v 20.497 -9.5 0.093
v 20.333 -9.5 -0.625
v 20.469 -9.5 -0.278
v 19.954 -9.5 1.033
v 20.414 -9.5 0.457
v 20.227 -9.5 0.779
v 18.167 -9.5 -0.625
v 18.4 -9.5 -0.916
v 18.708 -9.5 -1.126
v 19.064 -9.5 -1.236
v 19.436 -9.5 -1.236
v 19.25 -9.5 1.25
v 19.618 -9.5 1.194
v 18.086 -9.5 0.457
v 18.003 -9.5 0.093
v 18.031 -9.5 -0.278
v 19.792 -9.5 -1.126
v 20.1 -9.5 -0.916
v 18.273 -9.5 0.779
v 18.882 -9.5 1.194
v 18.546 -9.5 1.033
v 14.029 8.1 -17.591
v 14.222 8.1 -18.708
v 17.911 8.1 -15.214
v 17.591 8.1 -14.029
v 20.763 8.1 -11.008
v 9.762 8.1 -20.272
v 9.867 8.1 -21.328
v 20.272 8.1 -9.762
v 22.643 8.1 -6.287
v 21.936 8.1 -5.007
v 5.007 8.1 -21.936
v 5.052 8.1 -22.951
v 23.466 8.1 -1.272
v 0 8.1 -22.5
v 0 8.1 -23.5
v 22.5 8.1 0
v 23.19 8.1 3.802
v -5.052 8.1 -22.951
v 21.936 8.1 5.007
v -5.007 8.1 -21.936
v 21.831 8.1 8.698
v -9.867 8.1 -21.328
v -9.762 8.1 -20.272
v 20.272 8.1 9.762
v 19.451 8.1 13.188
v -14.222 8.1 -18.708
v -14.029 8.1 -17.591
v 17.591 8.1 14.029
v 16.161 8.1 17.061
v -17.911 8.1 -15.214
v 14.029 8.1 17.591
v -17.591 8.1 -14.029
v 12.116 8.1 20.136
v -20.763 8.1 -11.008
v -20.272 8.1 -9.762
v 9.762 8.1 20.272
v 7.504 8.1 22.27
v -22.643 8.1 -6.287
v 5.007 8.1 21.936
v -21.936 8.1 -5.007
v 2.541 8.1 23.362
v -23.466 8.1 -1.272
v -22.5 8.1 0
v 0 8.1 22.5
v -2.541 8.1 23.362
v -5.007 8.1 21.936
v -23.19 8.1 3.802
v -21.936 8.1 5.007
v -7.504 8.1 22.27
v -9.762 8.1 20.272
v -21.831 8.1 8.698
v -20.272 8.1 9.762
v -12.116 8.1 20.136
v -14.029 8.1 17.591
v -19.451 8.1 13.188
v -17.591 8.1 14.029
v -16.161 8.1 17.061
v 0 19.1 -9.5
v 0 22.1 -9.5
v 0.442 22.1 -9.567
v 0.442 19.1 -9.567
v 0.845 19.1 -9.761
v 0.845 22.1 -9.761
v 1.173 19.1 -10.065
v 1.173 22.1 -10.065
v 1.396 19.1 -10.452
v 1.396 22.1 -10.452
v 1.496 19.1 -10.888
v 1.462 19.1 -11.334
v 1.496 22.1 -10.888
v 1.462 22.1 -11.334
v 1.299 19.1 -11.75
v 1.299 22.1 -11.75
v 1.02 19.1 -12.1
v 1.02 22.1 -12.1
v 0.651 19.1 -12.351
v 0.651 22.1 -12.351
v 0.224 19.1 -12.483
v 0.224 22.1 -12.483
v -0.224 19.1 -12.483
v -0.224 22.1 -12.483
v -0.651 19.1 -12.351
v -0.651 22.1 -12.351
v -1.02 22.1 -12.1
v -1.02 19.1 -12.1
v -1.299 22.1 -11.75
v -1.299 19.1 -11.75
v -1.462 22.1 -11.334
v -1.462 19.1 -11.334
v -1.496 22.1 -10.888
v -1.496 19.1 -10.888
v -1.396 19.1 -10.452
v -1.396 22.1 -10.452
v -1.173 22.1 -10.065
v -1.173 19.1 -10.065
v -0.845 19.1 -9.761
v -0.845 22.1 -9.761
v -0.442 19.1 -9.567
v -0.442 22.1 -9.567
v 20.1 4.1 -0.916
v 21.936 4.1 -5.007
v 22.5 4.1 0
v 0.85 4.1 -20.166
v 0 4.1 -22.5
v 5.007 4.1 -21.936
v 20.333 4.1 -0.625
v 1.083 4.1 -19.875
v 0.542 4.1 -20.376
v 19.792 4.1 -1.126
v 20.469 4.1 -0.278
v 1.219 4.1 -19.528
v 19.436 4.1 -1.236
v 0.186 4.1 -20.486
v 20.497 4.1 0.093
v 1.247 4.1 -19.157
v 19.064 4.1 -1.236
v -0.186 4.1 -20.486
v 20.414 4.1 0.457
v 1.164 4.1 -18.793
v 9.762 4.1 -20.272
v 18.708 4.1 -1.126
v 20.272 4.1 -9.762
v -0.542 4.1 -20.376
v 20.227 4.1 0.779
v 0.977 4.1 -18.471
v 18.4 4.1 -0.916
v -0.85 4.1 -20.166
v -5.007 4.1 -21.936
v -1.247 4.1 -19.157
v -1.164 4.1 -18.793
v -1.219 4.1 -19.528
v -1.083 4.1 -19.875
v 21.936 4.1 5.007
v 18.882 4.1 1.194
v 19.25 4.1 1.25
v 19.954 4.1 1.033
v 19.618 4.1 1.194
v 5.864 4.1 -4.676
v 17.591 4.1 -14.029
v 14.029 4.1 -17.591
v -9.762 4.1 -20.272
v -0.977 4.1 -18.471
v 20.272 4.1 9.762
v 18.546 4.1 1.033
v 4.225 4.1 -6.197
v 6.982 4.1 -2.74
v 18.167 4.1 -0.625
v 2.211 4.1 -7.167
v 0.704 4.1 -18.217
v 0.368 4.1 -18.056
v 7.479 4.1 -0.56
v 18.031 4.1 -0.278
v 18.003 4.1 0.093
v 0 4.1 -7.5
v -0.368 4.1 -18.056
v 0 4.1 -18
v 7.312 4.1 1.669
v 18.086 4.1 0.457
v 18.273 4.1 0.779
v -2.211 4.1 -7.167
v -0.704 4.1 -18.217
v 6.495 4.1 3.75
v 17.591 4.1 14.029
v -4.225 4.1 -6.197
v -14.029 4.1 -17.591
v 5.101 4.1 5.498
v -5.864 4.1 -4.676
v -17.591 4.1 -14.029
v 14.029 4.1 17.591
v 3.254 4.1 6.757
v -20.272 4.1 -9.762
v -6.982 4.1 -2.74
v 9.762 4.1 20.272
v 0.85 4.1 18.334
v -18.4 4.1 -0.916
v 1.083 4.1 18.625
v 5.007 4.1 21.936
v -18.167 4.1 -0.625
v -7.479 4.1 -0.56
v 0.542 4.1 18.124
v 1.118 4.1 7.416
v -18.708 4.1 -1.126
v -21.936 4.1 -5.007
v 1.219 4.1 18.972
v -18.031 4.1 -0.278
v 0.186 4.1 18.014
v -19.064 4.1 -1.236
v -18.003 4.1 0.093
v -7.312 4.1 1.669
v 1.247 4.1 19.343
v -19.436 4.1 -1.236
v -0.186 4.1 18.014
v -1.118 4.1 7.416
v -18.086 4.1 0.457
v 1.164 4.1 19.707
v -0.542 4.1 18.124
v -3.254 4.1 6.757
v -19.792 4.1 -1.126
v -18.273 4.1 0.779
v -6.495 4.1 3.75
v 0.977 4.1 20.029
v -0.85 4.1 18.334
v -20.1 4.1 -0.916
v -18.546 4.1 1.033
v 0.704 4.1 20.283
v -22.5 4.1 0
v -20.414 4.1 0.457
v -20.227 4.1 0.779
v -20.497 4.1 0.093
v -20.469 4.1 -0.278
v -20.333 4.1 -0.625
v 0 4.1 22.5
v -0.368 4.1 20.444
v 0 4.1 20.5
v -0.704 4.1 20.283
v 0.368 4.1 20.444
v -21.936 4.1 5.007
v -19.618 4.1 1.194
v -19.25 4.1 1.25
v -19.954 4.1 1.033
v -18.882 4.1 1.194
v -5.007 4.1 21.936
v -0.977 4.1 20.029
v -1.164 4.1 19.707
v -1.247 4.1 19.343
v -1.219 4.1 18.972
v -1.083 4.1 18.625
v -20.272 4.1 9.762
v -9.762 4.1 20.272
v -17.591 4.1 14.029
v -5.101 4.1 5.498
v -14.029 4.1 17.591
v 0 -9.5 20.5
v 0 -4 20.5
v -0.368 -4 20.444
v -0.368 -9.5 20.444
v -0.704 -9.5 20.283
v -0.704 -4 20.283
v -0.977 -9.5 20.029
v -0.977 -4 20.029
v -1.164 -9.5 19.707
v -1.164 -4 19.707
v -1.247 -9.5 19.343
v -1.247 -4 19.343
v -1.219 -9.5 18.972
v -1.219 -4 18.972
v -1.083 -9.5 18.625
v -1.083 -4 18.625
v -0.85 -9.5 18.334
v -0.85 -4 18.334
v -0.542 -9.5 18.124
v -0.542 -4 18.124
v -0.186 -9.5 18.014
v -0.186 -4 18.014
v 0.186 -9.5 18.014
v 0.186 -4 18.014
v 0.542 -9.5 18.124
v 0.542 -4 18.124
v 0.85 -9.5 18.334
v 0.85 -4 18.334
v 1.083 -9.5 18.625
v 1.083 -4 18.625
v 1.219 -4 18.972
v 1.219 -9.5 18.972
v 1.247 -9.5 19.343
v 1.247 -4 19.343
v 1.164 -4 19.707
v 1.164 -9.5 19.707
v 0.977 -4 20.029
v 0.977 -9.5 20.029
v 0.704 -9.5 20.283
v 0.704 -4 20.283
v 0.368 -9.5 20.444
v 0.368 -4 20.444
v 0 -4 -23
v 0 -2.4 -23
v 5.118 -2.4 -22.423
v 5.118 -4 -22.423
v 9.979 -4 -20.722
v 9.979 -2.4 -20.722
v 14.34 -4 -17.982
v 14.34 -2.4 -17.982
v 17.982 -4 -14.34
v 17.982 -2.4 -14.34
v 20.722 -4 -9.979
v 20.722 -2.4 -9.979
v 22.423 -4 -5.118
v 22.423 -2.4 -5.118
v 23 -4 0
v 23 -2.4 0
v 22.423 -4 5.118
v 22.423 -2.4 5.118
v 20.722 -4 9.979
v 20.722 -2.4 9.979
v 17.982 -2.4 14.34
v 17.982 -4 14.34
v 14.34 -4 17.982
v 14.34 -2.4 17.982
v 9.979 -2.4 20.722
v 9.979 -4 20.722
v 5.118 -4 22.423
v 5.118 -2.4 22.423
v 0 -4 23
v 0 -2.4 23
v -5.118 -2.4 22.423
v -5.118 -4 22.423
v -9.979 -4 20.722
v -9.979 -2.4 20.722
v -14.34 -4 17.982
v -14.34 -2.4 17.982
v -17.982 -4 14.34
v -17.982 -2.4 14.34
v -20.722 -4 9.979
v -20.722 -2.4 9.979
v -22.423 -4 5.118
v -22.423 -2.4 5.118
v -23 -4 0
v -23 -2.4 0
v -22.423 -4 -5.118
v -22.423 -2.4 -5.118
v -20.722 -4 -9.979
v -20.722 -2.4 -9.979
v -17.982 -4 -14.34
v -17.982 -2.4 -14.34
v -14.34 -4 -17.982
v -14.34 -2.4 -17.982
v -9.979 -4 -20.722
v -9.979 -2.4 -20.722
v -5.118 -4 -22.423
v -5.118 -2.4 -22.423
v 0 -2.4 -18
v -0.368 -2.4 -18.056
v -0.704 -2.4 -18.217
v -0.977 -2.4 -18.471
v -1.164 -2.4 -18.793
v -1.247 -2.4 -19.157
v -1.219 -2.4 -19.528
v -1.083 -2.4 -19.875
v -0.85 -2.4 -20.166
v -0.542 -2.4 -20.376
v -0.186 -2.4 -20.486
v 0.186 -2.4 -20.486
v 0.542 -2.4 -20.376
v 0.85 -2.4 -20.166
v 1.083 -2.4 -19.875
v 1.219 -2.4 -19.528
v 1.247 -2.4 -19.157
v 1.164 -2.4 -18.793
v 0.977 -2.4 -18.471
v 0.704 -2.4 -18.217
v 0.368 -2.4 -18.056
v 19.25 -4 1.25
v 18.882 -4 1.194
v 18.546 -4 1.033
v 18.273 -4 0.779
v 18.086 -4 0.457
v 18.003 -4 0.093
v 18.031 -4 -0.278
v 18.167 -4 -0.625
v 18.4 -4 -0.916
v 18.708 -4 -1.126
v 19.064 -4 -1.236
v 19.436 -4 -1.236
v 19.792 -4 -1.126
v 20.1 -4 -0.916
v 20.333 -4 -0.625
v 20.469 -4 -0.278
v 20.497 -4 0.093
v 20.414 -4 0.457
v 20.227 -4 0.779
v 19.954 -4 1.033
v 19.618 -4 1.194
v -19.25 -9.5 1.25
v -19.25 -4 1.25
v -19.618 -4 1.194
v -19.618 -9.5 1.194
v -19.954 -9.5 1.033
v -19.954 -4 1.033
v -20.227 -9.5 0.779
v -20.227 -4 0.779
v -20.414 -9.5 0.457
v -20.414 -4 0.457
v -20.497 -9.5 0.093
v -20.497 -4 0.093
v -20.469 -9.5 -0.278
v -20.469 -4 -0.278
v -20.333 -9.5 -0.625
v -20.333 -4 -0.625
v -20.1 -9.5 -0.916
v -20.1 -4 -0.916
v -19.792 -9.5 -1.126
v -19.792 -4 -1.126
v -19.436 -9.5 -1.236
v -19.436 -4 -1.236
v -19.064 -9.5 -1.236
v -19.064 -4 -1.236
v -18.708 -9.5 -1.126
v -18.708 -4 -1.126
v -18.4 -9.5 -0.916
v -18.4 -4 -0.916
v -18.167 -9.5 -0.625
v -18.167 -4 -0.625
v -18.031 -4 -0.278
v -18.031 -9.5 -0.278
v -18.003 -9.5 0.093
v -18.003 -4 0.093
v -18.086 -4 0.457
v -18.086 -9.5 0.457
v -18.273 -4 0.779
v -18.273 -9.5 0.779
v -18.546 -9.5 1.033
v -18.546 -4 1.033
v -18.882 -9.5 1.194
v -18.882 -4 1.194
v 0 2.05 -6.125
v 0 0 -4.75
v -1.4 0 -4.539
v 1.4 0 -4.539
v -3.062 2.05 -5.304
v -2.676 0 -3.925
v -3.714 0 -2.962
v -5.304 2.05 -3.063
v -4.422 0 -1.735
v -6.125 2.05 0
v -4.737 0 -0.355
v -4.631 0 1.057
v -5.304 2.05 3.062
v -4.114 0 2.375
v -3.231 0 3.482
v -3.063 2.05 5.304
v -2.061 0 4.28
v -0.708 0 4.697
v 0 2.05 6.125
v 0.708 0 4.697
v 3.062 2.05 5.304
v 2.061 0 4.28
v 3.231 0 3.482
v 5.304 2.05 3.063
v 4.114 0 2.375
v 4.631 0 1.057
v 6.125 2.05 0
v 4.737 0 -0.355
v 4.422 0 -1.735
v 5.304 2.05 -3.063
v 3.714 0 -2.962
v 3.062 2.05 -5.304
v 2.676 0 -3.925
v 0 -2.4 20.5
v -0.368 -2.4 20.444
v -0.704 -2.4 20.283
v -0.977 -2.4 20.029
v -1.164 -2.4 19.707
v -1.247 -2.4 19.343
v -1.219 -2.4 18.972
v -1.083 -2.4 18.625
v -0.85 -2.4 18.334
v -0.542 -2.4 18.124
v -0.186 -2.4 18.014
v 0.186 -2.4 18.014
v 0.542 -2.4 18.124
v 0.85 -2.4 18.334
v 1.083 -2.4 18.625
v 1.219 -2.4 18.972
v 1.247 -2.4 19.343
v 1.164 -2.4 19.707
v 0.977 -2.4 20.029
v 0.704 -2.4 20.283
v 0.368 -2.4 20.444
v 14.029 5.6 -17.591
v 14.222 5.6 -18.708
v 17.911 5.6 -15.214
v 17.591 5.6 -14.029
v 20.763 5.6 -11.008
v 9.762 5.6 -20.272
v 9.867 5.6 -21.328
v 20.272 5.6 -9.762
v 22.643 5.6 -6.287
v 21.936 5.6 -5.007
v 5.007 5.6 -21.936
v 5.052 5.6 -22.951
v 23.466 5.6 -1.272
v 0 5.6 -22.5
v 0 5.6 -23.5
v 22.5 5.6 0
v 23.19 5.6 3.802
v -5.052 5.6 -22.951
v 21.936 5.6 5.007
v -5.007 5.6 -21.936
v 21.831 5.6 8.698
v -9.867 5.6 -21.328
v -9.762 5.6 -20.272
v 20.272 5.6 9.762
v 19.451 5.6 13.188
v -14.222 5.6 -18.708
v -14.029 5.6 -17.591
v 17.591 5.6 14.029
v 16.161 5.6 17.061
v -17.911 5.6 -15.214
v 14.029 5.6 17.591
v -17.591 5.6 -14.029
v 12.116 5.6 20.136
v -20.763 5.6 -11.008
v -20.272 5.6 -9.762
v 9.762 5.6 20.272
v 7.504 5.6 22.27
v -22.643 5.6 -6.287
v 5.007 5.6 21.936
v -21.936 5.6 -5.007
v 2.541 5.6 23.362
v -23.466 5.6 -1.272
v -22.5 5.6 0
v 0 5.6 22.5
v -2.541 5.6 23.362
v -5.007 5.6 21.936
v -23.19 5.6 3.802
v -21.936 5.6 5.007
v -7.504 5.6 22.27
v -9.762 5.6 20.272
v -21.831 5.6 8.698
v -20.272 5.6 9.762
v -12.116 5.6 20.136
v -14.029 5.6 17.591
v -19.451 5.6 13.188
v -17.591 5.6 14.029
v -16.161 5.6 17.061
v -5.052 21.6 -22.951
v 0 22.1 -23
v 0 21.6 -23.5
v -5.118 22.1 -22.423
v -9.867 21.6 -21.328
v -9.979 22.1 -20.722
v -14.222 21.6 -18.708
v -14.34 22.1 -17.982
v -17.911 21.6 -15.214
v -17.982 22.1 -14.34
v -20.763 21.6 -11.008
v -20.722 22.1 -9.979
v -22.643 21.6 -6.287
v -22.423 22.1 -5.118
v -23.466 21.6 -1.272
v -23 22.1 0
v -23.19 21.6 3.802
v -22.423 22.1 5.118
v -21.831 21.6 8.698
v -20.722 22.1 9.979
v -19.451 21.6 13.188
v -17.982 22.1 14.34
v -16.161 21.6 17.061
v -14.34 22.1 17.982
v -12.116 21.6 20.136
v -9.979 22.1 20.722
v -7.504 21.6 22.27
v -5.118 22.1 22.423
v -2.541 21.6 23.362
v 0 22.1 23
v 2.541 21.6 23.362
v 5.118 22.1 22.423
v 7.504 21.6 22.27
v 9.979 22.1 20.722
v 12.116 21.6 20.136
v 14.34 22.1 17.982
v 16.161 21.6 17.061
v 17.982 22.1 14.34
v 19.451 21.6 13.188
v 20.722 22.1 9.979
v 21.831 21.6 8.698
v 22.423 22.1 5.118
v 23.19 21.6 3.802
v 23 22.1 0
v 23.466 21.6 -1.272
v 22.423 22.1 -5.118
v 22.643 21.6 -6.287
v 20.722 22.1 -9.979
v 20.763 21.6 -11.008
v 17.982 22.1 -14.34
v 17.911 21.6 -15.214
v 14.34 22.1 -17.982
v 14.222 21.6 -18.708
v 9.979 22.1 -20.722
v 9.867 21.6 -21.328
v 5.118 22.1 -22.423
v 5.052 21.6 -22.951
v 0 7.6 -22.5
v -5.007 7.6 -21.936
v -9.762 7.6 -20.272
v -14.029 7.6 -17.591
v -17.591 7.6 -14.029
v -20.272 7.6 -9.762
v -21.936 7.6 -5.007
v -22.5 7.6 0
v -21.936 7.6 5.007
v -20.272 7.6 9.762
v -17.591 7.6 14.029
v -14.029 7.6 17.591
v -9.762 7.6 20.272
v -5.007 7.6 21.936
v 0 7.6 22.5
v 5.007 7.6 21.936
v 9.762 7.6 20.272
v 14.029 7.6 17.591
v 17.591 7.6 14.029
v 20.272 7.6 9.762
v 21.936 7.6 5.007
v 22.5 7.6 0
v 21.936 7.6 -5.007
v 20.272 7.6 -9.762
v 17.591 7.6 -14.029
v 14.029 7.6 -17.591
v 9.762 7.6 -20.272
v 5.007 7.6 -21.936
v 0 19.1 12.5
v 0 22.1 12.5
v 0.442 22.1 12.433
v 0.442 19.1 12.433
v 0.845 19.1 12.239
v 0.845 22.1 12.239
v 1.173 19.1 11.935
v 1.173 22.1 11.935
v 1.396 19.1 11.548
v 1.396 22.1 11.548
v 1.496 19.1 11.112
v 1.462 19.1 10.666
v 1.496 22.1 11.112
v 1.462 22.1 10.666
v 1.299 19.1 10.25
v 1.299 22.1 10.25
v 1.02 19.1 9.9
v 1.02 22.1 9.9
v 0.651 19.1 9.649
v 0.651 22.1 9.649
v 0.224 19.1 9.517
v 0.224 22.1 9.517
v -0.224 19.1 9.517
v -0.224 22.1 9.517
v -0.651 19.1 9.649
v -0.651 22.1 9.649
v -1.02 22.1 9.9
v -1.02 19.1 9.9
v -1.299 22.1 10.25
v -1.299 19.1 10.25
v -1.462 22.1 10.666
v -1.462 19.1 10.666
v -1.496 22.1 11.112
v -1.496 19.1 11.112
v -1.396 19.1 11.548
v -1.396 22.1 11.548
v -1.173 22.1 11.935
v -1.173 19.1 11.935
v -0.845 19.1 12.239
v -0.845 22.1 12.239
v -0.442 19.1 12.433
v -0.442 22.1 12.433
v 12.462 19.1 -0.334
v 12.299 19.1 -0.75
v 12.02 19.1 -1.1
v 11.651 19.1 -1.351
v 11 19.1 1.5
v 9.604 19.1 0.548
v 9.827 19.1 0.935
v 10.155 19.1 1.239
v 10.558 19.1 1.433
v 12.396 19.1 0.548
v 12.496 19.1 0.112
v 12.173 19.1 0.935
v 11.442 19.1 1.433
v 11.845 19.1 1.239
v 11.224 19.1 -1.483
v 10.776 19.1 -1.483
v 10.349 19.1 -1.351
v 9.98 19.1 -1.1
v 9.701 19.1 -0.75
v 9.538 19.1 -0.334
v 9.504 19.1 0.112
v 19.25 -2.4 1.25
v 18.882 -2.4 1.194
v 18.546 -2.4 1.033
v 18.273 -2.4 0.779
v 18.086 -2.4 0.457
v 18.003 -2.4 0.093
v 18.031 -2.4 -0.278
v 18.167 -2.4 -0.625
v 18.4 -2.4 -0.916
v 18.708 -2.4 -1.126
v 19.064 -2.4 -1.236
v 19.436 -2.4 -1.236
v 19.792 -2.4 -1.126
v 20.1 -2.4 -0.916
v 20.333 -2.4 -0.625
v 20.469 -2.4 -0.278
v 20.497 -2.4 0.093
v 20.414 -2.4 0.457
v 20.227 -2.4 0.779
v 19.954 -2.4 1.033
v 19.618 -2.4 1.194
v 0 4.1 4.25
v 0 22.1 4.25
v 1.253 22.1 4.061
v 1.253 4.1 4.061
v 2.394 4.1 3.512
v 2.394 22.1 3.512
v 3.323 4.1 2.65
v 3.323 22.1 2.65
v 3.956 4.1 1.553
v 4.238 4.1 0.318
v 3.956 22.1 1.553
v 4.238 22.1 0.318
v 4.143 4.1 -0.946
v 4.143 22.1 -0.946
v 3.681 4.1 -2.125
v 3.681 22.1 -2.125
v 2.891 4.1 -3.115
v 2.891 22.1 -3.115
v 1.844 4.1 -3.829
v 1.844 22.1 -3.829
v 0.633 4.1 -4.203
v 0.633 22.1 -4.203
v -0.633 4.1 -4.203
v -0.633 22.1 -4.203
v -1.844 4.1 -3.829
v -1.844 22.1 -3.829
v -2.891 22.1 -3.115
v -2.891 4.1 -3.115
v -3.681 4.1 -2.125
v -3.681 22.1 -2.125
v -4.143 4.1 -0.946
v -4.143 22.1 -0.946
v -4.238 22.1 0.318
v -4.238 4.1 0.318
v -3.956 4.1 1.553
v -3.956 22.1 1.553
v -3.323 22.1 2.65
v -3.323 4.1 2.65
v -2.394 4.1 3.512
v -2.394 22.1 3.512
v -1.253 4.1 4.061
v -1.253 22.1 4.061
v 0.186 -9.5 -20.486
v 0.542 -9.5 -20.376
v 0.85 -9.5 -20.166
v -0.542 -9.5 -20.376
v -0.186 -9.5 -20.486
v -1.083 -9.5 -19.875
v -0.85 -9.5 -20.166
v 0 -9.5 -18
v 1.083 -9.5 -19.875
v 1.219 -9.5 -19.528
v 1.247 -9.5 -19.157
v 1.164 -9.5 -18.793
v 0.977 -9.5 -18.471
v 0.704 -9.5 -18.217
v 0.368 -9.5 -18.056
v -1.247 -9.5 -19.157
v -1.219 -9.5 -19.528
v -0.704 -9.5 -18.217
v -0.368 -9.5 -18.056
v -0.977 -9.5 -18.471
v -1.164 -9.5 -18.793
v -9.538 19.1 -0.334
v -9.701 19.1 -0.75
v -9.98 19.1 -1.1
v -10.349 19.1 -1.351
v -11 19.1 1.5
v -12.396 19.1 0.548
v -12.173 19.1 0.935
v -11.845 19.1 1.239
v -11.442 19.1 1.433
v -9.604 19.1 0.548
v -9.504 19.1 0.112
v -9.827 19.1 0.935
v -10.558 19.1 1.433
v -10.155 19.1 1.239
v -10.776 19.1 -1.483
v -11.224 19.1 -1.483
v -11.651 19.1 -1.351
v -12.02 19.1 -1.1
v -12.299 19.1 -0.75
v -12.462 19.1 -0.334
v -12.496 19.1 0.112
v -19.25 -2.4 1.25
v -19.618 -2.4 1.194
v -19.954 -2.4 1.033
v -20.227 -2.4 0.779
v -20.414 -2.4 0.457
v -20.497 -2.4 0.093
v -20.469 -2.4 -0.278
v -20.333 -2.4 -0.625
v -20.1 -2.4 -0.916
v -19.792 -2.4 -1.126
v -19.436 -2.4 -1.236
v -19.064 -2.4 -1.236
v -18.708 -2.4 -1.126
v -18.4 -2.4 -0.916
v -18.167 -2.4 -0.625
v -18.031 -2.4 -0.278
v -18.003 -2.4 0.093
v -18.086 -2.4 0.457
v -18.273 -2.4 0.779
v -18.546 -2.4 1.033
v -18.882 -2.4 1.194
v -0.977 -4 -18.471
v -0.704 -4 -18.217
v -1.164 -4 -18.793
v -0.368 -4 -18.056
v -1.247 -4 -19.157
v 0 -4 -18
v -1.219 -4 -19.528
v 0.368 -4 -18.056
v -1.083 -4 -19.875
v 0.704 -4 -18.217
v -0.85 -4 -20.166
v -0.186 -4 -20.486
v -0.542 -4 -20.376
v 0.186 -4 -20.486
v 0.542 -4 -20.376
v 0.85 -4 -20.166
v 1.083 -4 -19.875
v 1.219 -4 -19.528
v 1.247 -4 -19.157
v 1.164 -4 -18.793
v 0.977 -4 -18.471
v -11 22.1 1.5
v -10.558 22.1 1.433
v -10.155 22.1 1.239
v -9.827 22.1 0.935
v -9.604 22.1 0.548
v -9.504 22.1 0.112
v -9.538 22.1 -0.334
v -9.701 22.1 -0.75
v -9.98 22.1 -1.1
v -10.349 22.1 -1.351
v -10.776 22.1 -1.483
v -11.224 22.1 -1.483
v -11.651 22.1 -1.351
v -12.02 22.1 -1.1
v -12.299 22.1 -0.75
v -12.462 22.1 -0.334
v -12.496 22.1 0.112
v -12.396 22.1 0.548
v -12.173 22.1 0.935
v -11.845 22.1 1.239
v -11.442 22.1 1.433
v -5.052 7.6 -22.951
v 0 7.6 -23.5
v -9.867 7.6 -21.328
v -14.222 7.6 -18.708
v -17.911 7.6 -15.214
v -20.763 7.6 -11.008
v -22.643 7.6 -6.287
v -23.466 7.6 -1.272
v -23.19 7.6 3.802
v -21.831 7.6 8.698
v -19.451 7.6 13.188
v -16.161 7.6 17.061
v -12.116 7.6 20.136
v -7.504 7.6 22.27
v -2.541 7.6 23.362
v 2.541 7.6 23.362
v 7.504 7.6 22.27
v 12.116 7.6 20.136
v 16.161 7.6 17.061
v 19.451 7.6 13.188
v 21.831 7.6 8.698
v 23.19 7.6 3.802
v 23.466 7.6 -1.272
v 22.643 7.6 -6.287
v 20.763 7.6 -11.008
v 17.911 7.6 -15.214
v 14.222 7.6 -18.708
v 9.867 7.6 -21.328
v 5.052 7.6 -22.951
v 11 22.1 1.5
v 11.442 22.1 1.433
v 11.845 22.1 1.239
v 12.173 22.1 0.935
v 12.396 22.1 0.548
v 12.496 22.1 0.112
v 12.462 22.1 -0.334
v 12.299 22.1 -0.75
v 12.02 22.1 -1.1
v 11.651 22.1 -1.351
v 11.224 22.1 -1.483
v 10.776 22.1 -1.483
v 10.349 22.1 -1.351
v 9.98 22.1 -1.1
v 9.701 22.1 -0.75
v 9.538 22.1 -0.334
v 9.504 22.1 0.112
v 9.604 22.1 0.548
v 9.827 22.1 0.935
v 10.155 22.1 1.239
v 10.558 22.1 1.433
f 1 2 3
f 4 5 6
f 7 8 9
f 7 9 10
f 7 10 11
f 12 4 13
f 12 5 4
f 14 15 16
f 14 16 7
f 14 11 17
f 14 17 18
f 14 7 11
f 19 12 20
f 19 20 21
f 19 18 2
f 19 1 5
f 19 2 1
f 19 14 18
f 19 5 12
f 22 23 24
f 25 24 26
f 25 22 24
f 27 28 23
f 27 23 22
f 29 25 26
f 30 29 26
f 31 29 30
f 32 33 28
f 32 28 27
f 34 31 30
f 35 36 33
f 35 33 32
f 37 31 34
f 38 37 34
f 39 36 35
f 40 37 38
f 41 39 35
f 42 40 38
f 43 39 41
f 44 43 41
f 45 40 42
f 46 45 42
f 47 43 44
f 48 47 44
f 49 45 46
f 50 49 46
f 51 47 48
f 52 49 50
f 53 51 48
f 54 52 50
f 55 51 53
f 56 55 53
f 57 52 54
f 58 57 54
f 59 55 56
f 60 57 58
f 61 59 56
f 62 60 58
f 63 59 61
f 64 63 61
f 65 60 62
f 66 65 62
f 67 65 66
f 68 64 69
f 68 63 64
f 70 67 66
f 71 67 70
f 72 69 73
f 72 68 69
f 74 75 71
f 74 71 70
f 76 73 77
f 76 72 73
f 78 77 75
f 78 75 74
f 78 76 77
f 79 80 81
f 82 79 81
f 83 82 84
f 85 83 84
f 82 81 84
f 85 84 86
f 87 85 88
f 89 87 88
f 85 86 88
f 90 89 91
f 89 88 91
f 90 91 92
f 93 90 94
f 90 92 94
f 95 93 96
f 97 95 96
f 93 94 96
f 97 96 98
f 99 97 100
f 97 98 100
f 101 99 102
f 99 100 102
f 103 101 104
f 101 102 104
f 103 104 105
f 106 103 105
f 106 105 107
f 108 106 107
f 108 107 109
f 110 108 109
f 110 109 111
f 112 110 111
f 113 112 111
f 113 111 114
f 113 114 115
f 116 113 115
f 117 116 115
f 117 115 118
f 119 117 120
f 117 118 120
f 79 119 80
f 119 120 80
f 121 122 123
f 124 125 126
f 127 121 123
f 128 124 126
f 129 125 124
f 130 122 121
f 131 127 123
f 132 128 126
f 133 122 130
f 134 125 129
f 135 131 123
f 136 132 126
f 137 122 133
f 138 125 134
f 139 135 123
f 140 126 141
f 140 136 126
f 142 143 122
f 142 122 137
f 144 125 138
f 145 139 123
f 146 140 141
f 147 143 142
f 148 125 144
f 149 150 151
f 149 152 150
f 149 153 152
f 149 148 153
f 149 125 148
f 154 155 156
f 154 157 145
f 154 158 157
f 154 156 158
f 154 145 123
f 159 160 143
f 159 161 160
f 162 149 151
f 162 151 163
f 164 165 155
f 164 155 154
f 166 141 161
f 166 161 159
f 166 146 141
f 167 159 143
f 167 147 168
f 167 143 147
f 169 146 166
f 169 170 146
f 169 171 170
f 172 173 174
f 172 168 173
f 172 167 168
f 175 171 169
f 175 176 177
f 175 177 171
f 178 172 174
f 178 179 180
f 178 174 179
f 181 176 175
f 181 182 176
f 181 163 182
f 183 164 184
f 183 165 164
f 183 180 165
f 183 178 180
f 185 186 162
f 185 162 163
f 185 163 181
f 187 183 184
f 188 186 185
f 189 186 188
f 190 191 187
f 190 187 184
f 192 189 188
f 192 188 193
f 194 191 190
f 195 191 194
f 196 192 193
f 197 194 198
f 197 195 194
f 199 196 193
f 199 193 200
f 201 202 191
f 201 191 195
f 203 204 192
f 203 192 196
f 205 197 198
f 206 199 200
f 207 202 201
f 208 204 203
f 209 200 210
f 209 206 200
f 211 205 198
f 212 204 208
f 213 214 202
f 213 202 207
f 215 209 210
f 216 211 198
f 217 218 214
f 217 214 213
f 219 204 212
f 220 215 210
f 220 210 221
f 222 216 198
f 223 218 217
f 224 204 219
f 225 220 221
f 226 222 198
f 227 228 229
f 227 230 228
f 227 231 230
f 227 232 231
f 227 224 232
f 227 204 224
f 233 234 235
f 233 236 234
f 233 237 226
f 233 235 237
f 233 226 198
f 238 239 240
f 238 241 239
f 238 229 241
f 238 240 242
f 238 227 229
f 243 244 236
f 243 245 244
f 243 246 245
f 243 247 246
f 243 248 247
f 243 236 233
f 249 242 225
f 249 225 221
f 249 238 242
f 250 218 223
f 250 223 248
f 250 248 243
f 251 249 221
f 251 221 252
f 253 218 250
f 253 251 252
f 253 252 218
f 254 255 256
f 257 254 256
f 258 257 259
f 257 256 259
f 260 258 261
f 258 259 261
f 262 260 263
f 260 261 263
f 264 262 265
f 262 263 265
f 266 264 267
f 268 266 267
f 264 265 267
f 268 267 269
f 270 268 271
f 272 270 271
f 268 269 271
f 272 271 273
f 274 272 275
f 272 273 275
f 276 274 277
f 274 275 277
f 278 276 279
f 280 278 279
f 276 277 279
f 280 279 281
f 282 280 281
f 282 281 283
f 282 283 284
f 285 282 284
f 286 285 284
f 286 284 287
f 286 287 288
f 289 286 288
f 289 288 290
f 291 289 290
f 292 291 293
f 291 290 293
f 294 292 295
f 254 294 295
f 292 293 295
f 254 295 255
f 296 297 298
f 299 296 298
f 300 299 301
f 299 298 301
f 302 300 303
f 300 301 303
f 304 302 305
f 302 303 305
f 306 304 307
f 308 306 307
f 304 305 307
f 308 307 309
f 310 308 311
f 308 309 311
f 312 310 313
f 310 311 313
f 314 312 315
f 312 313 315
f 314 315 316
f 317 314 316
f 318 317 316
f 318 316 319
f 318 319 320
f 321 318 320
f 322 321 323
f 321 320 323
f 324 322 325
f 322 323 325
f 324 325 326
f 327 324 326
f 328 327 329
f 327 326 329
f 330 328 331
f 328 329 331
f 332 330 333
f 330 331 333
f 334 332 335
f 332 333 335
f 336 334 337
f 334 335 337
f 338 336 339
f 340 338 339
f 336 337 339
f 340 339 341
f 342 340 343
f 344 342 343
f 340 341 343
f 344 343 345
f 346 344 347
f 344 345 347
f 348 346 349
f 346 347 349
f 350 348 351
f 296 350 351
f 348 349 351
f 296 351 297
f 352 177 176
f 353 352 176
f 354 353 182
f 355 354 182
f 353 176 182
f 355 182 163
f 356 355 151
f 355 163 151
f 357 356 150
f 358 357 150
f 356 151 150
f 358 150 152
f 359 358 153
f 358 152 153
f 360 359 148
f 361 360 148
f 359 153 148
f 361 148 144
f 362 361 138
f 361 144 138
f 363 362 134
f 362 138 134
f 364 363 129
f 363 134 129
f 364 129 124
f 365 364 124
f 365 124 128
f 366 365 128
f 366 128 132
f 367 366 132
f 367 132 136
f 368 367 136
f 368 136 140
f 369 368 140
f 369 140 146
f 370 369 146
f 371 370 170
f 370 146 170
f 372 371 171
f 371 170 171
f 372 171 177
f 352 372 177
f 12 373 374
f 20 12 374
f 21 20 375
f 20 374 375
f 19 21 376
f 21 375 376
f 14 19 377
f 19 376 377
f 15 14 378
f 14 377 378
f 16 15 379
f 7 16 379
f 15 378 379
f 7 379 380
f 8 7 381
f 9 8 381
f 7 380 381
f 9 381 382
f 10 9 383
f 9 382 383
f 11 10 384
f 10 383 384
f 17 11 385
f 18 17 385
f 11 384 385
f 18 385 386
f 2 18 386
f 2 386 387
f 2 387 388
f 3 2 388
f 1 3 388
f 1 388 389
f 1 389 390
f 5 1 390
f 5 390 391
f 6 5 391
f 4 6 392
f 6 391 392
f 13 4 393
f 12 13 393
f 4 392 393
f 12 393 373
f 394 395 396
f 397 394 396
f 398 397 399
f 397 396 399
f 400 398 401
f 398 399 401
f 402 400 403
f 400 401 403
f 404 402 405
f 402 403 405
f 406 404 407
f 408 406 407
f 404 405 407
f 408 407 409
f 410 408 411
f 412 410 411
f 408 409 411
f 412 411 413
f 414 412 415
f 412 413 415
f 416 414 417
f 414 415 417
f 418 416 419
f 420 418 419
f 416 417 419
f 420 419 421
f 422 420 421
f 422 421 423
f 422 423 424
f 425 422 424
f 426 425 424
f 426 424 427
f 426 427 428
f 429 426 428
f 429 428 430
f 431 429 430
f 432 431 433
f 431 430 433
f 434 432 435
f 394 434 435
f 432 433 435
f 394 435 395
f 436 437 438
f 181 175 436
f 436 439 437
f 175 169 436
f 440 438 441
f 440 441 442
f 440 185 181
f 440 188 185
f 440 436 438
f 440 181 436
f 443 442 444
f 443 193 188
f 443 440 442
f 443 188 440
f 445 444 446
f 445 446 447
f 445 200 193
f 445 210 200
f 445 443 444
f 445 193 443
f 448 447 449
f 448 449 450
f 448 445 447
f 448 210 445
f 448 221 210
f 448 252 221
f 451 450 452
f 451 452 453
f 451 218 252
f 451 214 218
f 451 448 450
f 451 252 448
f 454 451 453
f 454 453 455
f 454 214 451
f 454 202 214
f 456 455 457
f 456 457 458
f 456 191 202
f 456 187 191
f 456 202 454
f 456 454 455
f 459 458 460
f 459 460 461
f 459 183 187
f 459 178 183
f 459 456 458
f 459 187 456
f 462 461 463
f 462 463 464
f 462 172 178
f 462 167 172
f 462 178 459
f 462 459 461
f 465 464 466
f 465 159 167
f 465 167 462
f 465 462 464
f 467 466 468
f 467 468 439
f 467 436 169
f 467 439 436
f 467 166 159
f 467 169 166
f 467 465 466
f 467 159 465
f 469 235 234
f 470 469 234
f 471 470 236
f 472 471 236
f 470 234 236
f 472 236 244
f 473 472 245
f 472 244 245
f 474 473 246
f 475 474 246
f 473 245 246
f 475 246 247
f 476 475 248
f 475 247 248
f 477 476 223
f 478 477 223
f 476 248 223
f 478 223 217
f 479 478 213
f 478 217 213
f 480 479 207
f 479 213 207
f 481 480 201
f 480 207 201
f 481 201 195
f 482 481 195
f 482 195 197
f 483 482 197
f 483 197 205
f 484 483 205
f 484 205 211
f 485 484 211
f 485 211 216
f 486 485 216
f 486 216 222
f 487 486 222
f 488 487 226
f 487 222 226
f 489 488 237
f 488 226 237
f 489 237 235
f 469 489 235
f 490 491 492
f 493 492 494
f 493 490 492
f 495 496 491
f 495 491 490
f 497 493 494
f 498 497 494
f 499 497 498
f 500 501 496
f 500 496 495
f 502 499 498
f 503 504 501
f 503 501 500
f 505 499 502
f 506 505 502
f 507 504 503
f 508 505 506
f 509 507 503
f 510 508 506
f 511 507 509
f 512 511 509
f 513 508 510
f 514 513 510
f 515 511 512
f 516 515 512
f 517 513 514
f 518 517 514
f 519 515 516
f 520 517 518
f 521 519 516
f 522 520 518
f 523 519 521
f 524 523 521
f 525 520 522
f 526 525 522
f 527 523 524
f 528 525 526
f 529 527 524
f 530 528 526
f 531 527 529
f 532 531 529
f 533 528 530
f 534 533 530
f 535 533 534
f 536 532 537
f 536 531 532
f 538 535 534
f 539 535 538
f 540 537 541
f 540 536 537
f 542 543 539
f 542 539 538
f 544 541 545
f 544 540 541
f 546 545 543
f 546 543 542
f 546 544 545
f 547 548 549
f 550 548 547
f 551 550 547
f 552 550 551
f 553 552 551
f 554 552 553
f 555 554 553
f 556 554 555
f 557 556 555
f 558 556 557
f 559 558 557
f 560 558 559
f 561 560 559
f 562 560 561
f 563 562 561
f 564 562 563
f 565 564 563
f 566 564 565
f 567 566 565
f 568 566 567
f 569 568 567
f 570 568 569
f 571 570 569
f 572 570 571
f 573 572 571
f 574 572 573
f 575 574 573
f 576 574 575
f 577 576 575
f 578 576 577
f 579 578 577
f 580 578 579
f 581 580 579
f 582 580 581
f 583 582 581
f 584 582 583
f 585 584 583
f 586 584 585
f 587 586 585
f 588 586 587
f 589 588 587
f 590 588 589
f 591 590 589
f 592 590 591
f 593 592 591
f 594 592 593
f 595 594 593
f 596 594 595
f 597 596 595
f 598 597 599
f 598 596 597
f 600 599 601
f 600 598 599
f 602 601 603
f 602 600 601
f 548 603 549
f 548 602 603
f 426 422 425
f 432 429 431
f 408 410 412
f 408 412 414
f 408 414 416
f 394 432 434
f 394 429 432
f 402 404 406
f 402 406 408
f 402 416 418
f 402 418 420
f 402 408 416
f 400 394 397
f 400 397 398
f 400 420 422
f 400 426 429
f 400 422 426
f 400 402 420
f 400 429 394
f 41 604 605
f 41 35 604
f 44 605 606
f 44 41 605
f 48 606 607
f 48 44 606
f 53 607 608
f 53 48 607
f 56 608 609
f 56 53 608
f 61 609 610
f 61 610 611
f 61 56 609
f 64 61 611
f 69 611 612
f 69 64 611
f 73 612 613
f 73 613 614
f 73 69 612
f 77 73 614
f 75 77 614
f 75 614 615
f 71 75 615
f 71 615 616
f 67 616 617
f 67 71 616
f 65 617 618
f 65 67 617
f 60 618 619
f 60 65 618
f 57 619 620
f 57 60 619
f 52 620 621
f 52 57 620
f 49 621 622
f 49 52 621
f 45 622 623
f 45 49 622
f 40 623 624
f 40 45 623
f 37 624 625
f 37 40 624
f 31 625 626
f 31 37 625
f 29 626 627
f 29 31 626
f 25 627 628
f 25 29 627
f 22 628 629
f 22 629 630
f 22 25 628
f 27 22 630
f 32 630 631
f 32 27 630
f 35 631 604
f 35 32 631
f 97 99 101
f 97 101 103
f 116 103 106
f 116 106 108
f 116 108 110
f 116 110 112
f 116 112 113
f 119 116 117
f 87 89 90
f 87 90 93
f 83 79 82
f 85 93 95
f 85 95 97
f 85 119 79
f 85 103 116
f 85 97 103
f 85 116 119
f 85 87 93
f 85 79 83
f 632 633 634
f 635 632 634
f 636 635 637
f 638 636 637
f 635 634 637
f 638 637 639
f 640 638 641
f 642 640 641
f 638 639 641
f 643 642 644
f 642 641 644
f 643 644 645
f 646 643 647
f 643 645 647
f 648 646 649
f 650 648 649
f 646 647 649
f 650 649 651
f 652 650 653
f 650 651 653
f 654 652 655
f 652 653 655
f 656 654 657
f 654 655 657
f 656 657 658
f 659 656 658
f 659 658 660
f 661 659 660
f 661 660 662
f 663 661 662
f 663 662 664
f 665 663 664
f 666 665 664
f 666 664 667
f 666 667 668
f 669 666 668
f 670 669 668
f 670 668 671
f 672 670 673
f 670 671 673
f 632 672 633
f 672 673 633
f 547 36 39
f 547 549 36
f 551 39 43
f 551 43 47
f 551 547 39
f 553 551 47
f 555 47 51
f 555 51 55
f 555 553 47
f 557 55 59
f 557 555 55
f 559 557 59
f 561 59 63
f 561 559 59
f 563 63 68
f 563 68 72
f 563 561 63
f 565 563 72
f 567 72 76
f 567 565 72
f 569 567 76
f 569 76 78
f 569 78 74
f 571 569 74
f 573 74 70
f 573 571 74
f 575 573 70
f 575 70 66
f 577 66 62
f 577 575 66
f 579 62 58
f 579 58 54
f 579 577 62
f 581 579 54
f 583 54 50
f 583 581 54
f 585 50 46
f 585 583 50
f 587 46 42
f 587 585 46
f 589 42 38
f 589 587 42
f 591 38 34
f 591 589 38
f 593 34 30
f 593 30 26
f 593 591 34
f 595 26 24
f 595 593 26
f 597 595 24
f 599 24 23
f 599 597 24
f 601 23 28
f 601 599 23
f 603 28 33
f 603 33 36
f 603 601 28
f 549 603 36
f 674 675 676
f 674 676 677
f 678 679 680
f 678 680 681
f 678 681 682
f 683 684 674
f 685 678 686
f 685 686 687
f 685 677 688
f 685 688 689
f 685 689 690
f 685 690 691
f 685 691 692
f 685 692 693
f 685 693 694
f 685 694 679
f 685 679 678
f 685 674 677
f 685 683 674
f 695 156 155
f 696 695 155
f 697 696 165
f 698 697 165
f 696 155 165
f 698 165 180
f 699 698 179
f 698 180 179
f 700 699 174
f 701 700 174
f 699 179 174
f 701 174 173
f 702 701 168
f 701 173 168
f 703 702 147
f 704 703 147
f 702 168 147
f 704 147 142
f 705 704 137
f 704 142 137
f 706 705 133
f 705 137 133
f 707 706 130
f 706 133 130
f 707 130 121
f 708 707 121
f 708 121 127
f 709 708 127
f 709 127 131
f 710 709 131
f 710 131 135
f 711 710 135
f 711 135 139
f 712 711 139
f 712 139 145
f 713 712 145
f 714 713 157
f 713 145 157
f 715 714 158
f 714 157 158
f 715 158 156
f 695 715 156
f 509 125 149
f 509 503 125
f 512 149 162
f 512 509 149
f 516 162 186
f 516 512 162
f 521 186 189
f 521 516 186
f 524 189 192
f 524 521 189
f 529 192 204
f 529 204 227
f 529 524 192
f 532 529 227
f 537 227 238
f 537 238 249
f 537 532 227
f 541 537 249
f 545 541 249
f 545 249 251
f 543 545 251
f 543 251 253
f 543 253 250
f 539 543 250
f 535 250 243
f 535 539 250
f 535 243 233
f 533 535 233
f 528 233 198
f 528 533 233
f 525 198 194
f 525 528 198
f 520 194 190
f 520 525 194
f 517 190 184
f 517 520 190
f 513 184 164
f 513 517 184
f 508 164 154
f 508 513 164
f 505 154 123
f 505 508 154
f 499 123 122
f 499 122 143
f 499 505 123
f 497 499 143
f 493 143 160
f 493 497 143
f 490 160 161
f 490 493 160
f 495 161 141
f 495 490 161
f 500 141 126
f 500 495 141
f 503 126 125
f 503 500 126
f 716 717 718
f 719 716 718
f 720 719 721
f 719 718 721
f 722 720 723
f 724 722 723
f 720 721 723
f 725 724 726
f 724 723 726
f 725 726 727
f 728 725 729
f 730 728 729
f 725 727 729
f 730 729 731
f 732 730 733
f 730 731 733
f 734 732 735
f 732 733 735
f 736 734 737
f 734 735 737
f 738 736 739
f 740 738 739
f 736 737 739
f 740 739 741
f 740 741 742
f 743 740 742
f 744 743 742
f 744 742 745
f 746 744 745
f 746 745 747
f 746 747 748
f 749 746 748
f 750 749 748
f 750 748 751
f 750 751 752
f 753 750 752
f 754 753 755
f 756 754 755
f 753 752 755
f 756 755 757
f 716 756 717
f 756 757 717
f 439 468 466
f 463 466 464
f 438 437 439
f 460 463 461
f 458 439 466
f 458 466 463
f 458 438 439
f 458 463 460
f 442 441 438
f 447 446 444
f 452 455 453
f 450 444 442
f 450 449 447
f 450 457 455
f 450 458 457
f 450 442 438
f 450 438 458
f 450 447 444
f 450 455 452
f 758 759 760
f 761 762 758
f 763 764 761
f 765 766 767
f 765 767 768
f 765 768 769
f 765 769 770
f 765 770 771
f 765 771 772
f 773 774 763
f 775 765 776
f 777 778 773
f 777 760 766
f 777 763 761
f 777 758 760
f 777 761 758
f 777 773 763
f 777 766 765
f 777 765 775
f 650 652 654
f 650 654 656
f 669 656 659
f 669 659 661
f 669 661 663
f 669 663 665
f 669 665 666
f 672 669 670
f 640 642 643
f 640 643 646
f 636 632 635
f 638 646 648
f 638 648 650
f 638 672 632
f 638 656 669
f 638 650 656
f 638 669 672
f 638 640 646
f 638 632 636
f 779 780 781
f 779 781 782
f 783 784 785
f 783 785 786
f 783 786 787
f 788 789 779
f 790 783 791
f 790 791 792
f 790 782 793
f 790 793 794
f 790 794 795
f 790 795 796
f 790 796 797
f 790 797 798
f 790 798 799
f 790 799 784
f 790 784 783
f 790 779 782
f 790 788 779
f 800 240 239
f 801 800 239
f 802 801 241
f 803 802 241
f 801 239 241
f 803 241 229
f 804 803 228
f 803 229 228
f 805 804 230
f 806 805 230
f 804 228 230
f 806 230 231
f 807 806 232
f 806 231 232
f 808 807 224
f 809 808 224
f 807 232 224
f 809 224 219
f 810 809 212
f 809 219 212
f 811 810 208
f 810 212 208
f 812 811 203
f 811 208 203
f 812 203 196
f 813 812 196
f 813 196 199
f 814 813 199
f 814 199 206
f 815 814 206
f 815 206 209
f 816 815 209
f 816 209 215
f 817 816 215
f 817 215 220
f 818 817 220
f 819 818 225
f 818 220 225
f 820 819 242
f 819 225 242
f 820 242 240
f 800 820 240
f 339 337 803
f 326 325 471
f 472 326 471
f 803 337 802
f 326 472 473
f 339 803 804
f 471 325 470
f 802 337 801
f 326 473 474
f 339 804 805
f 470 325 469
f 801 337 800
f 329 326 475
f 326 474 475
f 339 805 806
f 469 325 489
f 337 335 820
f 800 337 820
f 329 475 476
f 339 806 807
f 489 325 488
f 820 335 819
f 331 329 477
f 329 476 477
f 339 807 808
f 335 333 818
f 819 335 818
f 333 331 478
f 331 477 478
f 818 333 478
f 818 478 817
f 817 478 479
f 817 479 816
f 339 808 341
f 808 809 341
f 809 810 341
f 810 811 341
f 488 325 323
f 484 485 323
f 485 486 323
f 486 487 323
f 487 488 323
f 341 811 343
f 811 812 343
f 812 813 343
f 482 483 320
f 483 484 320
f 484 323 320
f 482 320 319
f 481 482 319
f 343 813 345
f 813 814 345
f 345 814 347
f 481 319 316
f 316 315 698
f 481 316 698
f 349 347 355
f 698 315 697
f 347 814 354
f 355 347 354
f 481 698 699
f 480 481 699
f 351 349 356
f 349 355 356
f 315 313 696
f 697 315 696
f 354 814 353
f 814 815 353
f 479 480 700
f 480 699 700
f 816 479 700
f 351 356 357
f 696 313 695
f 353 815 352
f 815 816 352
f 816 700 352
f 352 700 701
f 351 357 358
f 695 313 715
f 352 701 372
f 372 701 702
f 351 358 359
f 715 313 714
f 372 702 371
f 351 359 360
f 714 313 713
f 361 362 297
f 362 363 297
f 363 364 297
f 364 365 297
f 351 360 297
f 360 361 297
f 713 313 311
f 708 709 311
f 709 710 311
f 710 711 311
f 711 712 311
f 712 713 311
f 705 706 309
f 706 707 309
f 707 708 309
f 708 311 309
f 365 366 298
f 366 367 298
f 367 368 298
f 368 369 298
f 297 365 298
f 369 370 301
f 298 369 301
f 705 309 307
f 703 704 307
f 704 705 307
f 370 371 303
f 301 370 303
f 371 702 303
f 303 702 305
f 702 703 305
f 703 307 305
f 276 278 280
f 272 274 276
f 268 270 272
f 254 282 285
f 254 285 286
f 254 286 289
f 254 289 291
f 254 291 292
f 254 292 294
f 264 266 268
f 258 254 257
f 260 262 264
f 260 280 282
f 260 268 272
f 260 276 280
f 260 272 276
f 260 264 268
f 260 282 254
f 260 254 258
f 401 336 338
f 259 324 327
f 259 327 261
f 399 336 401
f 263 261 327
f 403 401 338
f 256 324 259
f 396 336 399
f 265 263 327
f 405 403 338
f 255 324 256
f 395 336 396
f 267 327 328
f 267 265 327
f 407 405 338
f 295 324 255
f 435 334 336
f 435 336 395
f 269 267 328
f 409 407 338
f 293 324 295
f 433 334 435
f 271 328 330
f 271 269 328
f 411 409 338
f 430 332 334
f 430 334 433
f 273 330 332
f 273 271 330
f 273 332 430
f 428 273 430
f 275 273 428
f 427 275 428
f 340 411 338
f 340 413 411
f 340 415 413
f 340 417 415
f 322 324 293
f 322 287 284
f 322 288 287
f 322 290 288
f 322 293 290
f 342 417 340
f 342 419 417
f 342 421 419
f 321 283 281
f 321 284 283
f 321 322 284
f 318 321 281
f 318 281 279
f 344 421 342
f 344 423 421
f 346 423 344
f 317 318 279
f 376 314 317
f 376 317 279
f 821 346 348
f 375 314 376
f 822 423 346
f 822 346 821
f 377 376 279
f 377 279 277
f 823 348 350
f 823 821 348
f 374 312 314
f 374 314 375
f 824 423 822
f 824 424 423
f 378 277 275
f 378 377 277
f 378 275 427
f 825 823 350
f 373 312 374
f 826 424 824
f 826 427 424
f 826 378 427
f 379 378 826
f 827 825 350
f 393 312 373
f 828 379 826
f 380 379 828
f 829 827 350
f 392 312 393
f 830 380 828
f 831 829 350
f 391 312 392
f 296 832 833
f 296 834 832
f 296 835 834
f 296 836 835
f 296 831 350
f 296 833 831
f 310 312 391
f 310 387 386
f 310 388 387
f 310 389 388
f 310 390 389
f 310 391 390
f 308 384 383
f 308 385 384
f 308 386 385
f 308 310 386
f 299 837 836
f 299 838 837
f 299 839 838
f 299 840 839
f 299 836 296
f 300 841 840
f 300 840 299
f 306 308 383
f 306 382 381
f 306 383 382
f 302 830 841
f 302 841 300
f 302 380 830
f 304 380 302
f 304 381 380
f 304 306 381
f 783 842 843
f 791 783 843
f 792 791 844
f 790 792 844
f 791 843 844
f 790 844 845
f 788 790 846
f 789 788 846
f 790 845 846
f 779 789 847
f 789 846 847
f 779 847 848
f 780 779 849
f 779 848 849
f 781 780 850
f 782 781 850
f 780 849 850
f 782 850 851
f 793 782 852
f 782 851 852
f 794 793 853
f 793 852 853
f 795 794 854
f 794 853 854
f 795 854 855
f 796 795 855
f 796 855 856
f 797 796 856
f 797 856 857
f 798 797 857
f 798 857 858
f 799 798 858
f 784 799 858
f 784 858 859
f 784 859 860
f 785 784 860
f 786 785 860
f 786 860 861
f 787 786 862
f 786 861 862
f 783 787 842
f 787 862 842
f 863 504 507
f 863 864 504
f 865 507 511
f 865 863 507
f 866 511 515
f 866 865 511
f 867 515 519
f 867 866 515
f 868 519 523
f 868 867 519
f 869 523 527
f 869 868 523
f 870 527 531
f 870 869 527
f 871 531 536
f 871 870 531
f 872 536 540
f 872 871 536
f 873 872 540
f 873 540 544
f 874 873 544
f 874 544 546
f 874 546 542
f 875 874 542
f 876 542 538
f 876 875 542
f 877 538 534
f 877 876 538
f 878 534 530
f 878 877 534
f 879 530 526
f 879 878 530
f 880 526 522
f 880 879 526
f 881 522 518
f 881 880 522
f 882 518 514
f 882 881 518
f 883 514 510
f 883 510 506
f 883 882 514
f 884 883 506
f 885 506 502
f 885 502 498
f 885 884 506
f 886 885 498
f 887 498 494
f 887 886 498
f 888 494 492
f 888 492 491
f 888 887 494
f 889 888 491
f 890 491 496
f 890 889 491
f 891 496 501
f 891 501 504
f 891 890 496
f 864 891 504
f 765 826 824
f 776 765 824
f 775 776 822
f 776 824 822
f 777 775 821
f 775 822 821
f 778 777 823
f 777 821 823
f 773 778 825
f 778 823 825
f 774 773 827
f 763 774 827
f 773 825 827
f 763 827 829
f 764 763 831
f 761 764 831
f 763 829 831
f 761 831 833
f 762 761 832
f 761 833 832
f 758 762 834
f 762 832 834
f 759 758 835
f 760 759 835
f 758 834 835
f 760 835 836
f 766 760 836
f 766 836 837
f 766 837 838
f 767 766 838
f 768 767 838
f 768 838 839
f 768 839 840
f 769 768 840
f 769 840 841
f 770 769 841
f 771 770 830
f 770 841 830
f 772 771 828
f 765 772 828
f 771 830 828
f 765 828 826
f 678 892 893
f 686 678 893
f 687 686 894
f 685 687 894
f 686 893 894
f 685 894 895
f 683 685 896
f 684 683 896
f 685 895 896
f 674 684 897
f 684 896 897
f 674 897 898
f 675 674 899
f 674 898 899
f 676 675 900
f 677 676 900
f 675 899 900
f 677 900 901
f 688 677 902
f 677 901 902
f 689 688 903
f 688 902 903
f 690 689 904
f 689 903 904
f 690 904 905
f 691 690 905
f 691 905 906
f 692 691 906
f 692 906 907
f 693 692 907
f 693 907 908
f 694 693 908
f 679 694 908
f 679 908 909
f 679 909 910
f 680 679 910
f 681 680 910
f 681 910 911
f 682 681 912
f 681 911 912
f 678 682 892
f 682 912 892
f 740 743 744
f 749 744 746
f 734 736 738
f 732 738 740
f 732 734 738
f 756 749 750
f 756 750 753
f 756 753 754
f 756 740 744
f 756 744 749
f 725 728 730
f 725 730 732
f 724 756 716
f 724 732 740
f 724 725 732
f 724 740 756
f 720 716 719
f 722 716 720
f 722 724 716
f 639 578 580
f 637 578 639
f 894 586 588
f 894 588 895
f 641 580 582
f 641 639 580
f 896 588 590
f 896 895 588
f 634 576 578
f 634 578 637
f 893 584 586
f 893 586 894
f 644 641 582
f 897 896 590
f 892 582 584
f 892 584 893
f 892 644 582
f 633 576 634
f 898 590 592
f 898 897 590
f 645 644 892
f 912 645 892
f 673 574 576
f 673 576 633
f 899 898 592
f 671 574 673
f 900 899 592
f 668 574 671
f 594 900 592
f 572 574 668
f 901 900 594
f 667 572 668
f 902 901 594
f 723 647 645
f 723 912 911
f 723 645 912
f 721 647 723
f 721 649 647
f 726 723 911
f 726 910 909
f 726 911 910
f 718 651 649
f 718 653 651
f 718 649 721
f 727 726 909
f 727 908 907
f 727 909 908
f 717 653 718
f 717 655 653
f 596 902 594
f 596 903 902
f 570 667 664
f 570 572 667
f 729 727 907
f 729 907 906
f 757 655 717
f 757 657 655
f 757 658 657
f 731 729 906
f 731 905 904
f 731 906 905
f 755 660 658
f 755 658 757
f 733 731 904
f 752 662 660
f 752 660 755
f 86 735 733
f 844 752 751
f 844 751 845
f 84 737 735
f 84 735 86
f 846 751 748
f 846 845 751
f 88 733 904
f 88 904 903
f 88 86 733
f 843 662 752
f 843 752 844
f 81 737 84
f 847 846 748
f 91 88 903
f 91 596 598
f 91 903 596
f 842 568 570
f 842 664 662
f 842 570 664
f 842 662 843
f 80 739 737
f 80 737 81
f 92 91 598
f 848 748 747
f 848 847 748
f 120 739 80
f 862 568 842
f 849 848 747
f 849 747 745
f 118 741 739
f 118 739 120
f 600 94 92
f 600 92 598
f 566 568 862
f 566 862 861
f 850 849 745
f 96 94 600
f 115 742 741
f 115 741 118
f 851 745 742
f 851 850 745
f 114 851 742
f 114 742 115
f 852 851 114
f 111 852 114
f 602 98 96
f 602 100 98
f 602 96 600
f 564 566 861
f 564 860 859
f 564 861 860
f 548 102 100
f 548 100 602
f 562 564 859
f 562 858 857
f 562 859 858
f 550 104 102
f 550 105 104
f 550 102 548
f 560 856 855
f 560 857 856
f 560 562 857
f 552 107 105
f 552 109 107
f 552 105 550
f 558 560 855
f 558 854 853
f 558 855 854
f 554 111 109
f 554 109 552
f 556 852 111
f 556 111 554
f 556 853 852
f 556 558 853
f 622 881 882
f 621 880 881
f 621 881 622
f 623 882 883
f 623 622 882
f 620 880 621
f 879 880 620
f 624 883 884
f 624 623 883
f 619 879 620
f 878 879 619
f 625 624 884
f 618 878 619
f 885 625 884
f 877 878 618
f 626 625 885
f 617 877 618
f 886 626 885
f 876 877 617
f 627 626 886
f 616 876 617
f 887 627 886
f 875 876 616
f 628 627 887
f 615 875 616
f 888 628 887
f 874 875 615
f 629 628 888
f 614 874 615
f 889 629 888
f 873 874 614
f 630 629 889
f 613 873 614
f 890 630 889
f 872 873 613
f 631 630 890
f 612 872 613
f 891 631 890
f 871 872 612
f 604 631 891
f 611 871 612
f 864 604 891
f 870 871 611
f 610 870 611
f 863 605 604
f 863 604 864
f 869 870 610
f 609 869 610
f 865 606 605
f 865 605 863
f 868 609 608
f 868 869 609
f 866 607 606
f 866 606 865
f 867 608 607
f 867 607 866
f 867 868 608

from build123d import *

# Parameters (mm, degrees)
SKETCH_2_R          = 1.5
CUT_EXTRUDE_1_DEPTH = 3
SKETCH_3_R          = 4.25
CUT_EXTRUDE_2_DEPTH = 18
SKETCH_6_R          = 1.25
EXTRUDE_1_DEPTH     = 6.5
SKETCH_7_R          = 23
EXTRUDE_2_DEPTH     = 1.6
SKETCH_10_R         = 1.25
EXTRUDE_3_DEPTH     = 5.5


with BuildPart() as part:
    # 草图1 → 旋转1 (revolve)
    with BuildSketch(Plane.XY, mode=Mode.PRIVATE) as revolve_1_sk:
        Polygon((23, 22.1), (0, 22.1), (0, 0), (4.75, 0), (7.5, 4.1), (22.5, 4.1), (22.5, 5.6), (23.5, 5.6), (23.5, 7.6), (22.5, 7.6), (22.5, 8.1), (23.5, 8.1), (23.5, 21.6), align=None)
    revolve(revolve_1_sk.sketch.rotate(Axis((0, 0, 0), (0, 1, 0)), 90), axis=Axis((0, 0, 0), (0, 1, 0)))

    # 草图2 → 切除-拉伸1 (cut)
    with BuildSketch(Plane(origin=(0, 22.1, 0), x_dir=(1, 0, 0), z_dir=(0, 1, 0))):
        with Locations(Location((0, 11, 0), (0, 0, 270))):
            Circle(SKETCH_2_R)
        with Locations(Location((11, 0, 0), (0, 0, 270))):
            Circle(SKETCH_2_R)
        with Locations(Location((0, -11, 0), (0, 0, 270))):
            Circle(SKETCH_2_R)
        with Locations(Location((-11, 0, 0), (0, 0, 270))):
            Circle(SKETCH_2_R)
    extrude(amount=-CUT_EXTRUDE_1_DEPTH, mode=Mode.SUBTRACT)

    # 草图3 → 切除-拉伸2 (cut)
    with BuildSketch(Plane(origin=(0, 22.1, 0), x_dir=(1, 0, 0), z_dir=(0, 1, 0))):
        with Locations(Location((0, 0, 0), (0, 0, 270))):
            Circle(SKETCH_3_R)
    extrude(amount=-CUT_EXTRUDE_2_DEPTH, mode=Mode.SUBTRACT)

    # 草图6 → 凸台-拉伸1 (add)
    with BuildSketch(Plane.XZ.offset(-4.1)):
        with Locations(Location((0, 19.25, 0), (0, 0, 90))):
            Circle(SKETCH_6_R)
        with Locations(Location((19.25, 0, 0), (0, 0, 90))):
            Circle(SKETCH_6_R)
        with Locations(Location((0, -19.25, 0), (0, 0, 90))):
            Circle(SKETCH_6_R)
        with Locations(Location((-19.25, 0, 0), (0, 0, 90))):
            Circle(SKETCH_6_R)
    extrude(amount=EXTRUDE_1_DEPTH)

    # 草图7 → 凸台-拉伸2 (add)
    with BuildSketch(Plane.XZ.offset(2.4)):
        with Locations(Location((0, 0, 0), (0, 0, 270))):
            Circle(SKETCH_7_R)
    extrude(amount=EXTRUDE_2_DEPTH)

    # 草图10 → 凸台-拉伸3 (add)
    with BuildSketch(Plane.XZ.offset(4)):
        with Locations(Location((0, 19.25, 0), (0, 0, 90))):
            Circle(SKETCH_10_R)
        with Locations(Location((19.25, 0, 0), (0, 0, 90))):
            Circle(SKETCH_10_R)
        with Locations(Location((0, -19.25, 0), (0, 0, 90))):
            Circle(SKETCH_10_R)
        with Locations(Location((-19.25, 0, 0), (0, 0, 90))):
            Circle(SKETCH_10_R)
    extrude(amount=EXTRUDE_3_DEPTH)


solid = part.part
